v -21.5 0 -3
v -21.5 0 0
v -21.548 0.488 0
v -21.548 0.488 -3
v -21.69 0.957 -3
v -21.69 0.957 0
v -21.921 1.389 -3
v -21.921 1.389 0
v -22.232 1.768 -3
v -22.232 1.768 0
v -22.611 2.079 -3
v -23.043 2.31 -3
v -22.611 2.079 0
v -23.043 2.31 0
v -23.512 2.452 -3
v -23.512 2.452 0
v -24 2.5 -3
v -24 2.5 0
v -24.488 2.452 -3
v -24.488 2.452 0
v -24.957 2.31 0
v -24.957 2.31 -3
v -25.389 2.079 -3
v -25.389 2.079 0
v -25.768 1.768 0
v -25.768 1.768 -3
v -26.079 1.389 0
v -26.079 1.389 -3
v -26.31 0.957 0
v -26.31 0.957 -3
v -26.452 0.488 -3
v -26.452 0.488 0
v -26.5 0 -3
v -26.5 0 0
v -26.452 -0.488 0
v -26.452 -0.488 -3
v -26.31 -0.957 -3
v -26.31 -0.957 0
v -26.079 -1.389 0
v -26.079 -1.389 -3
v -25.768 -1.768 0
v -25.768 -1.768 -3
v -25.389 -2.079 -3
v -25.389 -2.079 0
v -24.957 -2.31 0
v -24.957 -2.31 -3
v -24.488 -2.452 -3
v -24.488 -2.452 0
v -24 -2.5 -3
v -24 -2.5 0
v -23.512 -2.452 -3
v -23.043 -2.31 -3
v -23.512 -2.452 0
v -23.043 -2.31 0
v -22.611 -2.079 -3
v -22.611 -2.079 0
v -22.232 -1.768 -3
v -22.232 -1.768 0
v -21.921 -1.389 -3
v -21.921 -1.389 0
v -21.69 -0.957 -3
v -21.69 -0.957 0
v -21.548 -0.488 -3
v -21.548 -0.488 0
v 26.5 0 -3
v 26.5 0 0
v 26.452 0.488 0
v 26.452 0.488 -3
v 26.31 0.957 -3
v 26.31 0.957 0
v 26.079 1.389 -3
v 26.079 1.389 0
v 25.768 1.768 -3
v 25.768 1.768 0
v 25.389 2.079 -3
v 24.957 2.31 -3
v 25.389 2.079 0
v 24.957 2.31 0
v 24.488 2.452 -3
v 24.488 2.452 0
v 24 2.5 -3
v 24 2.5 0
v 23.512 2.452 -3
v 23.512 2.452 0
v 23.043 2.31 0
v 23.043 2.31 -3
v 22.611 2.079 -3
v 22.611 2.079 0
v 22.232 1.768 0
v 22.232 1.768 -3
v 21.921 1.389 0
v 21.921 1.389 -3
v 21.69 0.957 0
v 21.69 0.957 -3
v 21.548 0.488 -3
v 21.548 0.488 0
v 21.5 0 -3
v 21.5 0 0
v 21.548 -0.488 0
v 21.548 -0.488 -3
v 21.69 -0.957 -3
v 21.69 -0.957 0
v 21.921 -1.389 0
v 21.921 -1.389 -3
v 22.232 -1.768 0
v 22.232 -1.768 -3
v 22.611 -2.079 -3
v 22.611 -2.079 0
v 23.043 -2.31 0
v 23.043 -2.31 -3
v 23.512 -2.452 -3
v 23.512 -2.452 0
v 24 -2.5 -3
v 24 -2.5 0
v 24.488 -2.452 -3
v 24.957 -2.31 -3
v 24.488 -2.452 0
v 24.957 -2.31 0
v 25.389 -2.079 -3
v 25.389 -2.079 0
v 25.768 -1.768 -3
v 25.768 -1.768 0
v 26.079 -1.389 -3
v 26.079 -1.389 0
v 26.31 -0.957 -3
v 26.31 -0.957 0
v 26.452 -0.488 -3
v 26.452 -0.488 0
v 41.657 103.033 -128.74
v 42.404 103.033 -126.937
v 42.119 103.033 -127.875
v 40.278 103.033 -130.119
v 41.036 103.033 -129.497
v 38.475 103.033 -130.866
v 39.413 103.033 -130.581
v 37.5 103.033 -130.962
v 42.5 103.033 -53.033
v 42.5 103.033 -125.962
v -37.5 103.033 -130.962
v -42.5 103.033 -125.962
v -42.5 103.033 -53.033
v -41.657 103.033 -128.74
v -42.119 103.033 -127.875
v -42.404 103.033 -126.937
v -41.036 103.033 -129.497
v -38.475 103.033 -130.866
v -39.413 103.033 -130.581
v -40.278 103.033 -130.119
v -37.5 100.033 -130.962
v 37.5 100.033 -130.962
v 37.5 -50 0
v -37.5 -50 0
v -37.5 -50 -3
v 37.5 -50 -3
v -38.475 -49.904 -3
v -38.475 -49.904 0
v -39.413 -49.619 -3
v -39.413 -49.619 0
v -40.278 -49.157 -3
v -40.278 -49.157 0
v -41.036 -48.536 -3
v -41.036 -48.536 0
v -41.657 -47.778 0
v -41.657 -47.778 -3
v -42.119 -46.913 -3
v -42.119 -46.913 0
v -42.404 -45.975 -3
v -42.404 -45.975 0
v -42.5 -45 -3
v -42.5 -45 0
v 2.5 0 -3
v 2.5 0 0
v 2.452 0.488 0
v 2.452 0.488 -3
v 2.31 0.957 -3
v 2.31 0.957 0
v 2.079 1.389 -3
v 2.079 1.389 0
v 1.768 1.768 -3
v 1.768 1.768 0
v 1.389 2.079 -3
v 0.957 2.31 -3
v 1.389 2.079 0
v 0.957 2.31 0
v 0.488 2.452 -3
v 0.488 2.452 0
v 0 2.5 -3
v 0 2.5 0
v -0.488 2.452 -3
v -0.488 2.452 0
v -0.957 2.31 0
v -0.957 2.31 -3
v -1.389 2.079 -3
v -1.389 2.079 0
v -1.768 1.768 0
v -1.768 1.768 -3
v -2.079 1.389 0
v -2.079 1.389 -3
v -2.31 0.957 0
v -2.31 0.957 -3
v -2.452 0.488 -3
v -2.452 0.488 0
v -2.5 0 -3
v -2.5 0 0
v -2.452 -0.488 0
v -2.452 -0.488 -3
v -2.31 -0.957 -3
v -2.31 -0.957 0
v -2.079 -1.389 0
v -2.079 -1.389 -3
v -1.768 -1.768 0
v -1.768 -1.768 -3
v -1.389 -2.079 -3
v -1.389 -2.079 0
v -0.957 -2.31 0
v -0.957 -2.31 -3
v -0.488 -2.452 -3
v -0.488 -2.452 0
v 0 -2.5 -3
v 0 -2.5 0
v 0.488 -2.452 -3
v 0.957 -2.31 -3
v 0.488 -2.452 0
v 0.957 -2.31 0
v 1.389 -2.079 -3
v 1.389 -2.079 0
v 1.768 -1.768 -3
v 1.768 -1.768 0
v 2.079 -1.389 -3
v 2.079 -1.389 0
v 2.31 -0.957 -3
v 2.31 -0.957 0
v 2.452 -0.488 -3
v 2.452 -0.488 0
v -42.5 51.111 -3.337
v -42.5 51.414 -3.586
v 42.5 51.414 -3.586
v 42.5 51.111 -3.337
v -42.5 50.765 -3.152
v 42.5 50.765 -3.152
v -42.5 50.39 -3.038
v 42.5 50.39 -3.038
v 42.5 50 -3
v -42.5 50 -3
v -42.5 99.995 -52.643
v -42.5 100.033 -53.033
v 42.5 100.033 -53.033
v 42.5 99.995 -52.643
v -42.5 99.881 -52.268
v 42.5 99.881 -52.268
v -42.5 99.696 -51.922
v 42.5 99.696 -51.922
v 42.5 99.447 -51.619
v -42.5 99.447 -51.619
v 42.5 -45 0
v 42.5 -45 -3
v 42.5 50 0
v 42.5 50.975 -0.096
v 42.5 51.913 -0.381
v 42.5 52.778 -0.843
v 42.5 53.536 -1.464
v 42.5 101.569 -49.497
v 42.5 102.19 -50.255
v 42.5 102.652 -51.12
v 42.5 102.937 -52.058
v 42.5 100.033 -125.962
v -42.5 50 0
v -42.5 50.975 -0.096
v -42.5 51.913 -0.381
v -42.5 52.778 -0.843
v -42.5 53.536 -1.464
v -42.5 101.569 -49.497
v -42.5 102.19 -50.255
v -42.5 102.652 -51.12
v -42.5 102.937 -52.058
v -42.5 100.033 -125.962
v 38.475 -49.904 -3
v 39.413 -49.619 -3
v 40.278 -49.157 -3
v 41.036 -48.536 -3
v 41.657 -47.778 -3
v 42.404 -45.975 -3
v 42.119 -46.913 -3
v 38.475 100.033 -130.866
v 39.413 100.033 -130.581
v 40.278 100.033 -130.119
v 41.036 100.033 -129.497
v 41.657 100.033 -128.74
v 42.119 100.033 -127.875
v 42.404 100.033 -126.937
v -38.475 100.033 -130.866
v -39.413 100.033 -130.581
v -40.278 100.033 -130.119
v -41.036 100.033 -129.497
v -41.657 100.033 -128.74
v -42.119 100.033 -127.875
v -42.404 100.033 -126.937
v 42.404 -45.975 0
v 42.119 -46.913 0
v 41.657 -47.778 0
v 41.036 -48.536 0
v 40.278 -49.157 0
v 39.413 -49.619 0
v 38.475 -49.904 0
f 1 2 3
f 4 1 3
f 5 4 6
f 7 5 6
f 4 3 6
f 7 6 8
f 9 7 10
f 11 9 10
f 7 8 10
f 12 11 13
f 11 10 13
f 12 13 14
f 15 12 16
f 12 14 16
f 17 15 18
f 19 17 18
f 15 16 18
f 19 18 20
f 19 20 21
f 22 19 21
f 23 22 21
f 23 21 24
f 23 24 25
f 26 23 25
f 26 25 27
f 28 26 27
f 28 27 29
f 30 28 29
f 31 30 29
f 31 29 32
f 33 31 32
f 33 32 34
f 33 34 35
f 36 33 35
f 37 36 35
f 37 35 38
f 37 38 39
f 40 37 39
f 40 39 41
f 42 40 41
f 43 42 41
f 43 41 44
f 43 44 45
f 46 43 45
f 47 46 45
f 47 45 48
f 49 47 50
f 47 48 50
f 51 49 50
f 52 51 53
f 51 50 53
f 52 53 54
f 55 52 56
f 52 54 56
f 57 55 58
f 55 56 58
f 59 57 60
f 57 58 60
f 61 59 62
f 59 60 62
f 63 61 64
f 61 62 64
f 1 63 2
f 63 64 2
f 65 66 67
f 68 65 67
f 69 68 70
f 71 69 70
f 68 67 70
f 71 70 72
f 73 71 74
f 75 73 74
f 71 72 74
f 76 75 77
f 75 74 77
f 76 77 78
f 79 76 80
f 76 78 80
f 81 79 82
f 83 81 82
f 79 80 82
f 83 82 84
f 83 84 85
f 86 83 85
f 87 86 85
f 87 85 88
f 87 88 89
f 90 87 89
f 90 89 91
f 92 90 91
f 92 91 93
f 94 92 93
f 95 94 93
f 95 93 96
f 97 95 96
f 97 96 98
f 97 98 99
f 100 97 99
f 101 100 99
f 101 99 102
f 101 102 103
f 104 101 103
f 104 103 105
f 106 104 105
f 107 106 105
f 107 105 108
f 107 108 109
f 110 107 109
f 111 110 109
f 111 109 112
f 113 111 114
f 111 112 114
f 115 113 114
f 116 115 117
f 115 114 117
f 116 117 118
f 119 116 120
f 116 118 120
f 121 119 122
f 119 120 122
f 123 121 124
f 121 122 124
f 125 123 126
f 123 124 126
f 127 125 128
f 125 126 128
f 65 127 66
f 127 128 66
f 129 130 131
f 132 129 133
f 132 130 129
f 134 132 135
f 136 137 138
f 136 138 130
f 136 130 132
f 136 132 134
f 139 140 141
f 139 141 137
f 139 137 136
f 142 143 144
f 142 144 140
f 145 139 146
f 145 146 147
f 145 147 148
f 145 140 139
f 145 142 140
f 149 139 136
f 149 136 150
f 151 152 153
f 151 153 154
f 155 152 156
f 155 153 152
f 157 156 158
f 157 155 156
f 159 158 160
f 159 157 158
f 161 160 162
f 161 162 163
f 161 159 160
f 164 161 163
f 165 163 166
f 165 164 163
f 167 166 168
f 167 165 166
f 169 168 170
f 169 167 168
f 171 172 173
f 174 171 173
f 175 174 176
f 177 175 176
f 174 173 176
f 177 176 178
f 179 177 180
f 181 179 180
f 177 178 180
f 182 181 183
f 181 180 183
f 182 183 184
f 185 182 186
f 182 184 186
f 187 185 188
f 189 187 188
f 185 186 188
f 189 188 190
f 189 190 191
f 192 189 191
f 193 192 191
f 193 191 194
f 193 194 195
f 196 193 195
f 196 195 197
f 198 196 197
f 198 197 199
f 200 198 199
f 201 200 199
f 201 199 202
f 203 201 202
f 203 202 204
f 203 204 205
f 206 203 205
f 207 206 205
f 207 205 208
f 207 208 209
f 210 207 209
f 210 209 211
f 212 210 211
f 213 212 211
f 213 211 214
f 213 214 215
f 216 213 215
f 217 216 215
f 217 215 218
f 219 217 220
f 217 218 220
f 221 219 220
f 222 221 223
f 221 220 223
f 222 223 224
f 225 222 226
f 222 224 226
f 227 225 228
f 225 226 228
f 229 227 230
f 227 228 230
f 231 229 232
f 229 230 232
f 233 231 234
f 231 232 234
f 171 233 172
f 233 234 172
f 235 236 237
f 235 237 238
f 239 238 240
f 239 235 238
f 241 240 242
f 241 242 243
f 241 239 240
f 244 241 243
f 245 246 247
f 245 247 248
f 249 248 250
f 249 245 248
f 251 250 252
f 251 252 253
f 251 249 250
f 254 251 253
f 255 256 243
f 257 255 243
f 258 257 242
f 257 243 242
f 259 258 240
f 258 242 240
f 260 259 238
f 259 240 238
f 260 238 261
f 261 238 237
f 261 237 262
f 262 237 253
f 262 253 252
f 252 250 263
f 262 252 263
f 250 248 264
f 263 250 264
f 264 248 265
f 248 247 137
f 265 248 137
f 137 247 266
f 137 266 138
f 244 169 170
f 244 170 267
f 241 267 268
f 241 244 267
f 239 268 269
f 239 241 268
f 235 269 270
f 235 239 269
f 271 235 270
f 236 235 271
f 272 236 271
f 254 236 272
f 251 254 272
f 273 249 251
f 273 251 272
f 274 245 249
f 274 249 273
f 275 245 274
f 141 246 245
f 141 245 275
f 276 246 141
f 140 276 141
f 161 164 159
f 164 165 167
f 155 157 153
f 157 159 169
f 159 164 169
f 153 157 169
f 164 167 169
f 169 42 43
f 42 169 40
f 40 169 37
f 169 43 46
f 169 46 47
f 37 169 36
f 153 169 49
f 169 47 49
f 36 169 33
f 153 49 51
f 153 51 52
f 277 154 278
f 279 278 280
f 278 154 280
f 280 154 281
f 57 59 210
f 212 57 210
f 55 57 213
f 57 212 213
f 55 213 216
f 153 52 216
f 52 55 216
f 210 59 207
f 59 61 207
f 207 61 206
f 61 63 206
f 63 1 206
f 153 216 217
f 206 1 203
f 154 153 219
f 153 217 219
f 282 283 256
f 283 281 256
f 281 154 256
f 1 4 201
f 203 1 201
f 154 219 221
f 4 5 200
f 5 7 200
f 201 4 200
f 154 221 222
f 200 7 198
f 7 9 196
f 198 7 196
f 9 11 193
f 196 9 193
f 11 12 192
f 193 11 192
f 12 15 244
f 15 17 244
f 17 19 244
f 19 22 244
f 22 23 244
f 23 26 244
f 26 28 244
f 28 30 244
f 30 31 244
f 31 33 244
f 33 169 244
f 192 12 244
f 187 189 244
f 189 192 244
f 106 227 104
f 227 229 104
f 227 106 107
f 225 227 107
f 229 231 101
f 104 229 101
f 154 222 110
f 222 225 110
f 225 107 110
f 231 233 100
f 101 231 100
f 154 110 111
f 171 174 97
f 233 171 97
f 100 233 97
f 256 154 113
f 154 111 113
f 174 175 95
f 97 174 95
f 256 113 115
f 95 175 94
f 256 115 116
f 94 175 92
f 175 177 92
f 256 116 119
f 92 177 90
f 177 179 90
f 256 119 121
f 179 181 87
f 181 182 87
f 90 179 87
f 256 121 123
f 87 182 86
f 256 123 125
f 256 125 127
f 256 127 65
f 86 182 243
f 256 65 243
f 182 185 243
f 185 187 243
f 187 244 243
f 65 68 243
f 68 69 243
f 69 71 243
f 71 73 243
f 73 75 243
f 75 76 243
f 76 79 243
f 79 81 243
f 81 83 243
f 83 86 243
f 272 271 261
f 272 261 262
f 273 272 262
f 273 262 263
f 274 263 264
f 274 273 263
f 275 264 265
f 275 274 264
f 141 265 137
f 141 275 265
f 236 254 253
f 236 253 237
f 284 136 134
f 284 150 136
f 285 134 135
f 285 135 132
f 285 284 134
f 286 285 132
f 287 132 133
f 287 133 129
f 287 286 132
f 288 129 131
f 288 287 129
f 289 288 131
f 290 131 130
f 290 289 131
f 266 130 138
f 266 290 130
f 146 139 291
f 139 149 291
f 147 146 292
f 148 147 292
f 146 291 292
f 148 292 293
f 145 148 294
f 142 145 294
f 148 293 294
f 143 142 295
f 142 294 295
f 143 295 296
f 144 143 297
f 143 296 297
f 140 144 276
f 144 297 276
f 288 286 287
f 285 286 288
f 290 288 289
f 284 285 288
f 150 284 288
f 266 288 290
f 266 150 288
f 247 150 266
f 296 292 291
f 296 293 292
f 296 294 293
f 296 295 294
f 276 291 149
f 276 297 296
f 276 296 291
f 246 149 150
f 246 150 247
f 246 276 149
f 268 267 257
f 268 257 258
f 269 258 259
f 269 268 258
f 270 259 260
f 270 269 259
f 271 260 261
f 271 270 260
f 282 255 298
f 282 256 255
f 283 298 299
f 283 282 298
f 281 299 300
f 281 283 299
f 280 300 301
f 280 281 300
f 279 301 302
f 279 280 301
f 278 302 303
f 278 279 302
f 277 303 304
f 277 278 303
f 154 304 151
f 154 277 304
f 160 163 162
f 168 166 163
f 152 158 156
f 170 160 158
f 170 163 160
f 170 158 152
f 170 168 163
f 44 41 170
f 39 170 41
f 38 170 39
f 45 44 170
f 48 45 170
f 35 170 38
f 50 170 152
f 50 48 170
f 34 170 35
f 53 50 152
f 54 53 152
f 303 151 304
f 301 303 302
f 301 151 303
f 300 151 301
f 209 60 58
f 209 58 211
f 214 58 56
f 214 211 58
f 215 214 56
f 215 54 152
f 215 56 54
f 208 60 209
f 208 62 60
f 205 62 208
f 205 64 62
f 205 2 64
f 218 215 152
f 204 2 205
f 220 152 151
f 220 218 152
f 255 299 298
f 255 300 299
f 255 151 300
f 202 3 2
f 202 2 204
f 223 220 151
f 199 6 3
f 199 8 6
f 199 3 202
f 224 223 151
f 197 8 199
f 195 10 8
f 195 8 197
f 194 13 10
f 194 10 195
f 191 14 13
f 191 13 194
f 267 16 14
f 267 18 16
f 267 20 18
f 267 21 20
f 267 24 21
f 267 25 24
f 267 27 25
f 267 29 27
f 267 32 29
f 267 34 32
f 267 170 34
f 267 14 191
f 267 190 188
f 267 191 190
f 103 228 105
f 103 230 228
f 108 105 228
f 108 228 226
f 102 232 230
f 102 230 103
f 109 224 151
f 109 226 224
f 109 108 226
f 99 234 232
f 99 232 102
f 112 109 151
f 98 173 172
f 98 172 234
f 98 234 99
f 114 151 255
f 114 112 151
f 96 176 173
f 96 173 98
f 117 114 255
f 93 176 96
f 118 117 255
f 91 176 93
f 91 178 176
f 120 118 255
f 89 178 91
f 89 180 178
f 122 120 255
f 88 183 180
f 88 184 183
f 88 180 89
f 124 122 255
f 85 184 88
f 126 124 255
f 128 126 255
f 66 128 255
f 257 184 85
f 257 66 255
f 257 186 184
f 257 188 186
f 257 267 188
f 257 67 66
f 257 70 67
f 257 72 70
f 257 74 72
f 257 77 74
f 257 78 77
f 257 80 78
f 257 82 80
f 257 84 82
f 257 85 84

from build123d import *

# Parameters (mm, degrees)
CROQUIS1_W             = 85
CROQUIS1_H             = 100
BRIDA_BASE3_DEPTH      = 3
BRIDA_DE_ARISTA1_DEPTH = 85
CROQUIS21_R            = 2.5
CORTAR_EXTRUIR3_DEPTH  = 35
REDONDEO3_R            = 5
REDONDEO4_R            = 5
BRIDA_DE_ARISTA2_DEPTH = 85
REDONDEO5_R            = 5


# Sheet-metal steps are written as plain solids
with BuildPart() as part:
    # Croquis1 → Brida base3 (new body)
    with BuildSketch(Plane.XY):
        Rectangle(CROQUIS1_W, CROQUIS1_H)
    extrude(amount=-BRIDA_BASE3_DEPTH)

    # Brida de arista1 section (across the edge) → Brida de arista1 (add)
    with BuildSketch(Plane(origin=(-42.5, 50.828427125, -3), x_dir=(0, -0.7071067811865438, -0.7071067811865512), z_dir=(1, 0, 0))):
        with BuildLine():
            Line((-3, 0.828427125), (-3, 68.757359313))
            Line((-3, 68.757359313), (0, 68.757359313))
            Line((0, 68.757359313), (0, 0.828427125))
            ThreePointArc((0, 0.828427125), (0.152240935, 0.06306026), (0.585786438, -0.585786438))
            Line((0.585786438, -0.585786438), (-1.535533906, -2.707106781))
            ThreePointArc((-1.535533906, -2.707106781), (-2.619397663, -1.084990037), (-3, 0.828427125))
        make_face()
    extrude(amount=BRIDA_DE_ARISTA1_DEPTH)

    # Croquis21 → Cortar-Extruir3 (cut)
    with BuildSketch(Plane.XY):
        Circle(CROQUIS21_R)
        with Locations((24, 0)):
            Circle(CROQUIS21_R)
        with Locations((-24, 0)):
            Circle(CROQUIS21_R)
    extrude(amount=-CORTAR_EXTRUIR3_DEPTH, mode=Mode.SUBTRACT)

    # Redondeo3
    redondeo3_edges = [part.edges().sort_by_distance(p)[0] for p in [
        (42.5, -50, -1.5),
    ]]
    fillet(redondeo3_edges, radius=REDONDEO3_R)

    # Redondeo4
    redondeo4_edges = [part.edges().sort_by_distance(p)[0] for p in [
        (-42.5, -50, -1.5),
    ]]
    fillet(redondeo4_edges, radius=REDONDEO4_R)

    # Brida de arista2 section (across the edge) → Brida de arista2 (add)
    with BuildSketch(Plane(origin=(-42.5, 100.033008589, -52.204581464), x_dir=(0, -1, 0), z_dir=(1, 0, 0))):
        with BuildLine():
            Line((-3, 0.828427125), (-3, 78.757359313))
            Line((-3, 78.757359313), (0, 78.757359313))
            Line((0, 78.757359313), (0, 0.828427125))
            ThreePointArc((0, 0.828427125), (0.152240935, 0.06306026), (0.585786438, -0.585786438))
            Line((0.585786438, -0.585786438), (-1.535533906, -2.707106781))
            ThreePointArc((-1.535533906, -2.707106781), (-2.619397663, -1.084990037), (-3, 0.828427125))
        make_face()
    extrude(amount=BRIDA_DE_ARISTA2_DEPTH)

    # Redondeo5
    redondeo5_edges = [part.edges().sort_by_distance(p)[0] for p in [
        (-42.5, 101.533008589, -130.961940777),
        (42.5, 101.533008589, -130.961940777),
    ]]
    fillet(redondeo5_edges, radius=REDONDEO5_R)


solid = part.part
